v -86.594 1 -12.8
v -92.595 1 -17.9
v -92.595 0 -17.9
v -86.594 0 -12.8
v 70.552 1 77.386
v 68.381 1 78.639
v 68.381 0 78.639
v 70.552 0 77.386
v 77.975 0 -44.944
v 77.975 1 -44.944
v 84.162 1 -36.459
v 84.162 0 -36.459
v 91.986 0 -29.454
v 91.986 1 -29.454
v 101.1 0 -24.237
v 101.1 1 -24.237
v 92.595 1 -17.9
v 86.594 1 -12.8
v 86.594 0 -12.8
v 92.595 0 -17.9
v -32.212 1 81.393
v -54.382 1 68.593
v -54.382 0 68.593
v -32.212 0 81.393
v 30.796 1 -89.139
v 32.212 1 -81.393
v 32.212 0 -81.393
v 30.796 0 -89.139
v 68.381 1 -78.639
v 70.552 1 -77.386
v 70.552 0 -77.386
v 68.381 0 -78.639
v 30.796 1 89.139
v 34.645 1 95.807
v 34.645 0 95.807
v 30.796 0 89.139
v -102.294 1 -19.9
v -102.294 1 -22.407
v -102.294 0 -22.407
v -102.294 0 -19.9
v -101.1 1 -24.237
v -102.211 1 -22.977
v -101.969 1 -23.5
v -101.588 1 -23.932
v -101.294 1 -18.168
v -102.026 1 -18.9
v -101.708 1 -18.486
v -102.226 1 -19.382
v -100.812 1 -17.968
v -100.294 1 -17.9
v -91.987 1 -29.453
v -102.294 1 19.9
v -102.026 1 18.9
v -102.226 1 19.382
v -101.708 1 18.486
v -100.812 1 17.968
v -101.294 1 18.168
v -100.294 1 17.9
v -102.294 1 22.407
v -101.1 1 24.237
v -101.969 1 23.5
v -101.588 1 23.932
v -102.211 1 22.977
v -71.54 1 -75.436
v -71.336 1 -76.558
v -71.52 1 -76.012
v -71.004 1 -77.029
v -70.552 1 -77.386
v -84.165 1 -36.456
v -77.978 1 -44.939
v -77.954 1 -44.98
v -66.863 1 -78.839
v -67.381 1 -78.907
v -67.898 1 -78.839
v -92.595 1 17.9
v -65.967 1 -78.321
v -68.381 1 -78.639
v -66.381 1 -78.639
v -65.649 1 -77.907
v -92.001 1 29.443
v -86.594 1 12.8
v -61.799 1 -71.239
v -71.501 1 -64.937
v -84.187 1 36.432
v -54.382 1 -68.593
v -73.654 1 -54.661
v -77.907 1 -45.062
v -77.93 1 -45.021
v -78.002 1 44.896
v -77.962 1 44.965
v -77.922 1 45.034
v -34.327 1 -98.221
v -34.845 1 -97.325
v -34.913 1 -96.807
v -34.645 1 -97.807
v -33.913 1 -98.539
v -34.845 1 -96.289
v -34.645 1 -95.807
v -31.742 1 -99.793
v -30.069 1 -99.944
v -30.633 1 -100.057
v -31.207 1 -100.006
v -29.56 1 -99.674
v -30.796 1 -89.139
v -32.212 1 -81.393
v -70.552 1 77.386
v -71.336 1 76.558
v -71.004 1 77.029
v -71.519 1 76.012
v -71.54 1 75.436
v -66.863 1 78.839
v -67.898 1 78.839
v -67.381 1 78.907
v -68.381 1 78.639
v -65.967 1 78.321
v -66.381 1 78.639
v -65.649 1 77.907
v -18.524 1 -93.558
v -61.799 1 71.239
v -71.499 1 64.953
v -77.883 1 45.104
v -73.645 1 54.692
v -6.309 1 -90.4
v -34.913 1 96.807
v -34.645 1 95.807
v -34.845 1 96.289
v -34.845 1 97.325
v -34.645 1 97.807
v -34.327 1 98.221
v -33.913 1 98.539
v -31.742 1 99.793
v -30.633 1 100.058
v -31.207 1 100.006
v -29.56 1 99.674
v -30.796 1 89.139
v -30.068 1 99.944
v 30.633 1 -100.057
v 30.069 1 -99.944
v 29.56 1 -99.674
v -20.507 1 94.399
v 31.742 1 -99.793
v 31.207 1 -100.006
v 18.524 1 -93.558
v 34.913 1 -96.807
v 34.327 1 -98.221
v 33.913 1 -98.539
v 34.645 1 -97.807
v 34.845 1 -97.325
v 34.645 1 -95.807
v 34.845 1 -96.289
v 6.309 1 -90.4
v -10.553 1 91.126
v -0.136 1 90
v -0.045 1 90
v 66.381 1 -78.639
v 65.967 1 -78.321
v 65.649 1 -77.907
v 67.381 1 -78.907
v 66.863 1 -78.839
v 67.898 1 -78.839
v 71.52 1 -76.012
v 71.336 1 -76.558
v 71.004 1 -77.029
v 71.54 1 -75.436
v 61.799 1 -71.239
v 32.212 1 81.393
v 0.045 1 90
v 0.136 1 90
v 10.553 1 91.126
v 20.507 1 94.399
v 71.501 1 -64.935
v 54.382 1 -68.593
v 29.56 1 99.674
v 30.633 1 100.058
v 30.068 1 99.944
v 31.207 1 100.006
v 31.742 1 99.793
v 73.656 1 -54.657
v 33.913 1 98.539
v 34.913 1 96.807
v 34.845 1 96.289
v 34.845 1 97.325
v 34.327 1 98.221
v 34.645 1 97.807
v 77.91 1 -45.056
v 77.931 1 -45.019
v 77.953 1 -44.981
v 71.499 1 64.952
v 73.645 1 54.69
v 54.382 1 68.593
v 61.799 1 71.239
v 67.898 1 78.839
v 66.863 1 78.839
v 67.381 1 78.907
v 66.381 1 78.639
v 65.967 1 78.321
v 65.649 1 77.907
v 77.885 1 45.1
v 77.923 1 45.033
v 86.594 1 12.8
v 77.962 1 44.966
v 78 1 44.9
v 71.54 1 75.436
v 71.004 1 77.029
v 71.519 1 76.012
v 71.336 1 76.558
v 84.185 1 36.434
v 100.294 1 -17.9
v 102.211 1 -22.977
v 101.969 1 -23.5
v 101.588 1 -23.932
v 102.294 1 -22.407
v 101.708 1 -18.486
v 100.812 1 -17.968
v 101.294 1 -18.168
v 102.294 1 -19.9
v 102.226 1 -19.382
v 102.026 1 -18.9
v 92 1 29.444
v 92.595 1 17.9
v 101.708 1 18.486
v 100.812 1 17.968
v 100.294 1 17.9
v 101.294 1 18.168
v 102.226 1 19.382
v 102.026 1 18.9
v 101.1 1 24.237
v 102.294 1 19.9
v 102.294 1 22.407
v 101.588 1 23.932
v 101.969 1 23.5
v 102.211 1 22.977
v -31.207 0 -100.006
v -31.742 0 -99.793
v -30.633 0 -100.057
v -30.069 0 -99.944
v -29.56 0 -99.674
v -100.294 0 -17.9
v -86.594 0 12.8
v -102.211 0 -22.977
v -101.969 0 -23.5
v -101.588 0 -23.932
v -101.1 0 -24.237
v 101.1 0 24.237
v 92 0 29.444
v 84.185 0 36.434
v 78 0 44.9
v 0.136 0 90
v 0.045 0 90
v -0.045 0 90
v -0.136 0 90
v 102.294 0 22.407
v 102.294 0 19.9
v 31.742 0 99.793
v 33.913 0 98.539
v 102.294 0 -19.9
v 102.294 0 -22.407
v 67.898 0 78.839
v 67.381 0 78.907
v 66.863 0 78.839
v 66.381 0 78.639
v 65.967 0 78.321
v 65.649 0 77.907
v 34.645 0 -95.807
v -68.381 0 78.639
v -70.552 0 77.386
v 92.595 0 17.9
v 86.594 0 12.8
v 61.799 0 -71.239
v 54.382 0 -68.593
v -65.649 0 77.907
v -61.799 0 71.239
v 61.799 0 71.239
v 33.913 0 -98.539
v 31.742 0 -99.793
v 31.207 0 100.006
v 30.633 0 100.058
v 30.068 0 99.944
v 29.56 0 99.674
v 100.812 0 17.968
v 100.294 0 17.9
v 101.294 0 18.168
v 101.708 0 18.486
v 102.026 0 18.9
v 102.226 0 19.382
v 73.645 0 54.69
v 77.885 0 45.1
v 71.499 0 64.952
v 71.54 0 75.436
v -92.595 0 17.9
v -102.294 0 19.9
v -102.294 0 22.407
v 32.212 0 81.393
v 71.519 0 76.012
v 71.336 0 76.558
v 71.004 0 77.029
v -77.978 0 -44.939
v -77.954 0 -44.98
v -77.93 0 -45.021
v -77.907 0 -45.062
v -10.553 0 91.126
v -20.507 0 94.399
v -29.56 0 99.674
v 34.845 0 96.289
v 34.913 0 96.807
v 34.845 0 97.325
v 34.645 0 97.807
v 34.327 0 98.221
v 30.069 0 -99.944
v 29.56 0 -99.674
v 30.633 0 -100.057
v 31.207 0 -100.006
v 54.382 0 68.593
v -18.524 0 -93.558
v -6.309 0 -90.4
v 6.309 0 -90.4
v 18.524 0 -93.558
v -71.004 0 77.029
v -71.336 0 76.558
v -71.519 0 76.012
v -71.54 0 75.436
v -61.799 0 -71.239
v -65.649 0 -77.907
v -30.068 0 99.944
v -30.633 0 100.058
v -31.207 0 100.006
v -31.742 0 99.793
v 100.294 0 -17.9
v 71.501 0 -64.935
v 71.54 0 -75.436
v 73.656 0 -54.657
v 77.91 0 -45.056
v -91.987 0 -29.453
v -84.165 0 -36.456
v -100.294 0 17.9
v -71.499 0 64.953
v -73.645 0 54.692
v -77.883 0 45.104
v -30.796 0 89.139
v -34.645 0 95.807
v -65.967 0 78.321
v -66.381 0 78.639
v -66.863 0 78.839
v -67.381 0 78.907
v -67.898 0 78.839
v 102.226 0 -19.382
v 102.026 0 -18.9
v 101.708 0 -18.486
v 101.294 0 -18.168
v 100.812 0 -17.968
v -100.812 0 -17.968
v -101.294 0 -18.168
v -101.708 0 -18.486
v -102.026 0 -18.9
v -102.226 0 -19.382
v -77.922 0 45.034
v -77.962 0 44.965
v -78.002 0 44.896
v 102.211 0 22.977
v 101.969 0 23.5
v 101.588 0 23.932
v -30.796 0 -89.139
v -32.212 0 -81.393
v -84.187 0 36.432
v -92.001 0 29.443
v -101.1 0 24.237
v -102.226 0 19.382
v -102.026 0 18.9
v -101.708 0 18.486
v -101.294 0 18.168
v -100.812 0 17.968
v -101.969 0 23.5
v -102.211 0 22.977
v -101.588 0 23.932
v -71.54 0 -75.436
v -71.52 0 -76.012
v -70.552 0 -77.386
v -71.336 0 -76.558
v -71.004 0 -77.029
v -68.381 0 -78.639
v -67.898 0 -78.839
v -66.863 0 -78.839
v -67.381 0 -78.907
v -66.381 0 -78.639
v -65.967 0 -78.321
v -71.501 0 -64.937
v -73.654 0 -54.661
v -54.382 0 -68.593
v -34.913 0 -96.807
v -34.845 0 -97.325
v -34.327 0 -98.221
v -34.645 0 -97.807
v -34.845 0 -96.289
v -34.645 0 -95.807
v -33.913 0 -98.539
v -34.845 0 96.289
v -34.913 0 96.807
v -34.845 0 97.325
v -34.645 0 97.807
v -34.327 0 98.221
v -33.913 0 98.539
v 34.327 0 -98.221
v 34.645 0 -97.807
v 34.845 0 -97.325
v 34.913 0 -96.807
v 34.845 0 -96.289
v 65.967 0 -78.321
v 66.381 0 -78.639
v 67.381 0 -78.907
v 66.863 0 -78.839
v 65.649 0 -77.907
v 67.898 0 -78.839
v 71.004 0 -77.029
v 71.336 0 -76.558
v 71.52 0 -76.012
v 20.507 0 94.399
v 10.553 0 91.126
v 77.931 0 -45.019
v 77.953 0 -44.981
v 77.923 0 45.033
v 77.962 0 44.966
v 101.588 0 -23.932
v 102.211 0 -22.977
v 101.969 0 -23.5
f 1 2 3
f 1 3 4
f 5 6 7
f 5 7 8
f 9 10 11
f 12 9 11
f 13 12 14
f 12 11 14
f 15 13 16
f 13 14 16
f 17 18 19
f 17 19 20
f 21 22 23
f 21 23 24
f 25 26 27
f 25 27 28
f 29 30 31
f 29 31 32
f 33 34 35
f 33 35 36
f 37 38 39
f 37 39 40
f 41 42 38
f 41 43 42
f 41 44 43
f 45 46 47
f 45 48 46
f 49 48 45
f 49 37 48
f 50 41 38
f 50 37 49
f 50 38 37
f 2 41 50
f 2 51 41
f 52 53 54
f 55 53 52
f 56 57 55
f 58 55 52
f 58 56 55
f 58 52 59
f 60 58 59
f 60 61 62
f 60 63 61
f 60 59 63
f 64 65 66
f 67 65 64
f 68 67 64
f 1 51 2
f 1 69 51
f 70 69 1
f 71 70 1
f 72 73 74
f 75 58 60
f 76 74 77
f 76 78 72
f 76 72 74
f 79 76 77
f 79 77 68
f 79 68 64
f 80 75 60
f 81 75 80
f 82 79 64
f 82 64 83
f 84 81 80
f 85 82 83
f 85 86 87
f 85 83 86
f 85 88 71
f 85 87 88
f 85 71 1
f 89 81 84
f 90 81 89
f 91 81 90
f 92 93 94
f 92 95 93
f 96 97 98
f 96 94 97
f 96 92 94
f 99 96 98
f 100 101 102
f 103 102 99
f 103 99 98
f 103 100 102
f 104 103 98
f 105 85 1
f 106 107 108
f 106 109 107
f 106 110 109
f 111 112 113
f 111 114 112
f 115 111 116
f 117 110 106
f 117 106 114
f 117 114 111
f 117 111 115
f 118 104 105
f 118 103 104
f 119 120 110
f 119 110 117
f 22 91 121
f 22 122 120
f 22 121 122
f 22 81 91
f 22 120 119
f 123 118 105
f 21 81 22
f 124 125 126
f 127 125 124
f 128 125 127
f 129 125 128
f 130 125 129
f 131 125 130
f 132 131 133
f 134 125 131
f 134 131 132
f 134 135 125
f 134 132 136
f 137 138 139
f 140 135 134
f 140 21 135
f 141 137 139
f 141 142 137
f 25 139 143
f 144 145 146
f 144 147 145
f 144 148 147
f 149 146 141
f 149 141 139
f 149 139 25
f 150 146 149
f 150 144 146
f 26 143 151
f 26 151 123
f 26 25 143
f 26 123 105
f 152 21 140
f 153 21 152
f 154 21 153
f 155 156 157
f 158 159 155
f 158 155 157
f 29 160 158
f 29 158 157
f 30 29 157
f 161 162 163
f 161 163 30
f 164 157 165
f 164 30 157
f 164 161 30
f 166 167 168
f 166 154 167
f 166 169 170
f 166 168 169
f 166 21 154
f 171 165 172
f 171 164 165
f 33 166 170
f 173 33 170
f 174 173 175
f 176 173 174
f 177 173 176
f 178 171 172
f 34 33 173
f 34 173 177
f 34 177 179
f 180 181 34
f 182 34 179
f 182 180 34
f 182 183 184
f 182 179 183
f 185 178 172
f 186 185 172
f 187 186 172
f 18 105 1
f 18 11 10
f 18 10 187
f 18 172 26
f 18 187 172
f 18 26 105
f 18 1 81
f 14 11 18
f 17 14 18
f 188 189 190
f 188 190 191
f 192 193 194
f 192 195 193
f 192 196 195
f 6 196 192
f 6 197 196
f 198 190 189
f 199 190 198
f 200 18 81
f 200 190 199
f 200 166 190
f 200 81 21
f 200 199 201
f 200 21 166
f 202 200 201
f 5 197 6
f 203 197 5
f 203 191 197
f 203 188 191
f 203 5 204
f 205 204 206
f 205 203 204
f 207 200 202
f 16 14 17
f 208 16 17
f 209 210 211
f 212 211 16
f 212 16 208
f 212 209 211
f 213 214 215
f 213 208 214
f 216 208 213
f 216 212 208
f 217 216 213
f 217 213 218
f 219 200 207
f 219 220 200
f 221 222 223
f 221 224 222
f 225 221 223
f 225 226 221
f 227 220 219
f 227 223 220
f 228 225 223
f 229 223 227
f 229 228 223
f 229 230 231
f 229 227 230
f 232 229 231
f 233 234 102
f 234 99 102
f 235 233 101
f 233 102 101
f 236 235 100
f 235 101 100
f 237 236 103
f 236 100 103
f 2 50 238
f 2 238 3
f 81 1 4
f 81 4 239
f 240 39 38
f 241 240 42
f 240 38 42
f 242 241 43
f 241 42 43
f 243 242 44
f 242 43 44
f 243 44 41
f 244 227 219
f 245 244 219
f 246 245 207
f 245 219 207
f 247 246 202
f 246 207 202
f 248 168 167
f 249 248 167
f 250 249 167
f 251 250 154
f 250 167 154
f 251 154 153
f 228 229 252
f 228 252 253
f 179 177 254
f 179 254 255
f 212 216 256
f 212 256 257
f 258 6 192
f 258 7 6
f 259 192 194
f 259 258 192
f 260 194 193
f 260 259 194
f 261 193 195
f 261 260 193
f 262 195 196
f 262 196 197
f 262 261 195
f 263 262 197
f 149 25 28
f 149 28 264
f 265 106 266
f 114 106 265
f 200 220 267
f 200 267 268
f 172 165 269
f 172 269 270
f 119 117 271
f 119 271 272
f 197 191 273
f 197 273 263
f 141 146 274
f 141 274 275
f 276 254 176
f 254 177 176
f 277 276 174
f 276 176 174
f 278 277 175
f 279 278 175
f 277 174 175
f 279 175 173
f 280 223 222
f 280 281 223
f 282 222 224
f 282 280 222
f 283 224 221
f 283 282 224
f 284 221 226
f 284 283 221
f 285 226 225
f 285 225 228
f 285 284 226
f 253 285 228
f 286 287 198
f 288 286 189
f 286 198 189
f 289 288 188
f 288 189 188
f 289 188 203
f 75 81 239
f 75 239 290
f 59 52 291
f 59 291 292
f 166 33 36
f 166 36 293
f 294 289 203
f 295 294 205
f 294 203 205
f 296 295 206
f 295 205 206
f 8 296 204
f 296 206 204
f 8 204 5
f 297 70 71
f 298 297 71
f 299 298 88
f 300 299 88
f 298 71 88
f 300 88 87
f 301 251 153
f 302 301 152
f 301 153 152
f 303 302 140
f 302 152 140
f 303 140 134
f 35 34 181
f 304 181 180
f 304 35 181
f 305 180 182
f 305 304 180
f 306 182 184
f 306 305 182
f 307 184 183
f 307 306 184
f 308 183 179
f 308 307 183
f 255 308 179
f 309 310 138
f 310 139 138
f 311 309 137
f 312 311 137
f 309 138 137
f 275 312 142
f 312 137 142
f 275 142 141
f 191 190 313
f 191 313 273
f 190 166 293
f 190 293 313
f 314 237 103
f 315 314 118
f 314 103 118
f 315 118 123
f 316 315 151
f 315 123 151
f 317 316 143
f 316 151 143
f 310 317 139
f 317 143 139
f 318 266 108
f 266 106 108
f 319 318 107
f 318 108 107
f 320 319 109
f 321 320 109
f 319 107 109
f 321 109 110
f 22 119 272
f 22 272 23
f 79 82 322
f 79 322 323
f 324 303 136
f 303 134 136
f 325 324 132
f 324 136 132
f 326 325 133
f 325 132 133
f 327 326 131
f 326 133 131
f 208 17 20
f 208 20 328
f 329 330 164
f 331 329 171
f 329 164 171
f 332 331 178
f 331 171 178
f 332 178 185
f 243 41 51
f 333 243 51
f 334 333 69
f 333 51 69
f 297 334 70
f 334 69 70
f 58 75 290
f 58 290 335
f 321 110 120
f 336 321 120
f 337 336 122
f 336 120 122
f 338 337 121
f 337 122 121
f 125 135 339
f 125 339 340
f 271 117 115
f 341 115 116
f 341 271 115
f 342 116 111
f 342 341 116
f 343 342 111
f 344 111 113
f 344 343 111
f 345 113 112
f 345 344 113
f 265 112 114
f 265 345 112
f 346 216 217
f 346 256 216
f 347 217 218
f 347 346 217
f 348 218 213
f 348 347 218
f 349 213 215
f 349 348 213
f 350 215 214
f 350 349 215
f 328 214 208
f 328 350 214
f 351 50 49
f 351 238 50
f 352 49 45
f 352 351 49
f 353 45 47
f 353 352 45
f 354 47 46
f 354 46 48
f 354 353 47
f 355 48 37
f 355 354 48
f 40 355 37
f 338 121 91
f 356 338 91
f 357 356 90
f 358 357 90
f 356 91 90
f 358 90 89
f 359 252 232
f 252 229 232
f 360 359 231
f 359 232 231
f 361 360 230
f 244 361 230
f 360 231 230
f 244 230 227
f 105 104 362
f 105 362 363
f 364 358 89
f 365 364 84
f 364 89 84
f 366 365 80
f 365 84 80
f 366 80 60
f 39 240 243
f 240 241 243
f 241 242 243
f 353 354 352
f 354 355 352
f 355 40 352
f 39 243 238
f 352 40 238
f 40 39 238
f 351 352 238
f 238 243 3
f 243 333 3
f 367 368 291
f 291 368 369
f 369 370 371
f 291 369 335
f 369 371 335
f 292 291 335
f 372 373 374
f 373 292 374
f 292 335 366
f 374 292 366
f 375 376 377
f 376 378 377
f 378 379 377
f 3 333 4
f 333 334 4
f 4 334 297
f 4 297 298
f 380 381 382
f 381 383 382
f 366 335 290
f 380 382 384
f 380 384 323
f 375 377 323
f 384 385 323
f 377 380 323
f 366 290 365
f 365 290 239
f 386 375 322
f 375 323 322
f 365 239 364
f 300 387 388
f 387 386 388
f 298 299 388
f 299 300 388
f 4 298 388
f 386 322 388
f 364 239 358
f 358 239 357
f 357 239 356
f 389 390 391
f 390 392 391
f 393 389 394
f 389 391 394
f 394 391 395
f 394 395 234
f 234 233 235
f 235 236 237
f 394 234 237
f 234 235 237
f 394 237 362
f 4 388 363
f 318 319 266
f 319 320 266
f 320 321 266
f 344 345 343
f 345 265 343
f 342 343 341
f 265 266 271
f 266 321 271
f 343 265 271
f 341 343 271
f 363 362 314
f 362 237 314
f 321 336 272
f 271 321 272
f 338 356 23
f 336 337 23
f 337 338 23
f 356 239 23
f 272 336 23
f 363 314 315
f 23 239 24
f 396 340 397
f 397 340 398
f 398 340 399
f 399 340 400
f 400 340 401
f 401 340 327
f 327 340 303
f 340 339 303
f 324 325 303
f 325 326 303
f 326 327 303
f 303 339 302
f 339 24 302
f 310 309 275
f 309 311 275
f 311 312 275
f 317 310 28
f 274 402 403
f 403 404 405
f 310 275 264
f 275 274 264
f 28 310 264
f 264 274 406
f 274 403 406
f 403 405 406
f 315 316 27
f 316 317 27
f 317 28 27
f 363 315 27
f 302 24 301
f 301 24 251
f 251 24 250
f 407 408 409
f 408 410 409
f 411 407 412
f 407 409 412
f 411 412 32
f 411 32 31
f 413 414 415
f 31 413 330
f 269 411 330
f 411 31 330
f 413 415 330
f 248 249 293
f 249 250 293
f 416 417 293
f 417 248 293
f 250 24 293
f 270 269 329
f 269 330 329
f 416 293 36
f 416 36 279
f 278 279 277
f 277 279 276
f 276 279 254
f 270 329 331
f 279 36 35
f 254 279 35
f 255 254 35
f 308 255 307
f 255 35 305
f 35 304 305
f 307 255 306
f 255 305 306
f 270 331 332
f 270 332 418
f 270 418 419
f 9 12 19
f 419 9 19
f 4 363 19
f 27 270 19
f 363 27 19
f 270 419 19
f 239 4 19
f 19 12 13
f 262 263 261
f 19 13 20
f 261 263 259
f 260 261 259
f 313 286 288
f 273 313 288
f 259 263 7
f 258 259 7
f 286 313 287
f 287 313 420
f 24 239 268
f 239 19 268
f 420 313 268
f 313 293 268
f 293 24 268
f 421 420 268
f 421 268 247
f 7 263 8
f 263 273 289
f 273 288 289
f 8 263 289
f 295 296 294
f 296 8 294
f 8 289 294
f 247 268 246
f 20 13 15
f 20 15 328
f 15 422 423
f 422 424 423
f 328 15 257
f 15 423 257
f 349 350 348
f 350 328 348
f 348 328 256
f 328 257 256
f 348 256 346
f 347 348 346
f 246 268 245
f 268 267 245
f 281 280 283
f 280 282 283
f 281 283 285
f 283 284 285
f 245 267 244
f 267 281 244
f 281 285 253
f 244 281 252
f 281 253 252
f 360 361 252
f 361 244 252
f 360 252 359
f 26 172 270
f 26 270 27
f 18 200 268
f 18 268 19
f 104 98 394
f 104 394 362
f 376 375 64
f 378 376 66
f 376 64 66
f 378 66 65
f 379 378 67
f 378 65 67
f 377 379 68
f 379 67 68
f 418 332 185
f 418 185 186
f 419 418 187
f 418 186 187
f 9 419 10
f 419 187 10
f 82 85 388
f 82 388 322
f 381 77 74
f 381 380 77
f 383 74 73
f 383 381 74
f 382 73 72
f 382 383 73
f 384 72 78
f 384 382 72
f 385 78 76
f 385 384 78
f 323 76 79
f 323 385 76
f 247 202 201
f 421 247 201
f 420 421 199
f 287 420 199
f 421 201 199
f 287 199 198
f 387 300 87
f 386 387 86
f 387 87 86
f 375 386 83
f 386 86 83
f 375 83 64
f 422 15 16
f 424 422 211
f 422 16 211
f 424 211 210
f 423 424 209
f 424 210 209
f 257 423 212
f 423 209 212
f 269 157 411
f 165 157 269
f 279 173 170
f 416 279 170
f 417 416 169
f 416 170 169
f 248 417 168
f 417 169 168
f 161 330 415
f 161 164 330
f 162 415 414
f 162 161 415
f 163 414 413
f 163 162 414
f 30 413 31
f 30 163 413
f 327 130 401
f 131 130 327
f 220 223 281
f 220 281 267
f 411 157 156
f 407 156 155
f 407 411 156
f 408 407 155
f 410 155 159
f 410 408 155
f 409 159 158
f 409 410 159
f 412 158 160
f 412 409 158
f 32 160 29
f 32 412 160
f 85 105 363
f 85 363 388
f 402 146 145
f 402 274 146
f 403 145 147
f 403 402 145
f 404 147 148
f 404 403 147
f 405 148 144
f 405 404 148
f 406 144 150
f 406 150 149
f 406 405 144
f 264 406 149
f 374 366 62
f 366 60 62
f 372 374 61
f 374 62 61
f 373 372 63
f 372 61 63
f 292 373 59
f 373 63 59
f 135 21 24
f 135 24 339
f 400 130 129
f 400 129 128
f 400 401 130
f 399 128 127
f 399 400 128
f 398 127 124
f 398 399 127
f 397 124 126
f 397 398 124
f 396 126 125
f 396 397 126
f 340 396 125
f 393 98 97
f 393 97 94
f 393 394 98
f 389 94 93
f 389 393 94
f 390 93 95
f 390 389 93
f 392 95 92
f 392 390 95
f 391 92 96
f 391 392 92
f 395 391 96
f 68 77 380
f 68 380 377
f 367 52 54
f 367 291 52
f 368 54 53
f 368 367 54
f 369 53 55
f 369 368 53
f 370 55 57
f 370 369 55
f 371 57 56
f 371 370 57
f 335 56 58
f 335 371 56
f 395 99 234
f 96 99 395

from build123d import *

# Parameters (mm, degrees)
SKETCH2_R           = 1.35
BOSS_EXTRUDE1_DEPTH = 1
CIRPATTERN1_COUNT   = 6
CUT_EXTRUDE3_DEPTH  = 5
CUT_EXTRUDE9_DEPTH  = 10
CUT_EXTRUDE10_DEPTH = 186.676097905
FILLET2_R           = 2


with BuildPart() as part:
    # Sketch2 → Boss-Extrude1 (new body)
    with BuildSketch(Plane(origin=(0, 0, 0), x_dir=(1, 0, 0), z_dir=(0, 1, 0))):
        Polygon((0, 125), (-58.08143708, 125), (-35.58143708, 86.02885683), (-56.712456933, 73.82885683), (-79.212456933, 112.8), (-108.253175473, 62.5), (0, 0), align=None)
        with Locations(Location((-37.385731074, 81.753985699, 0), (0, 0, 270))):
            Circle(SKETCH2_R, mode=Mode.SUBTRACT)
        with Locations(Location((-52.108162939, 73.253985699, 0), (0, 0, 270))):
            Circle(SKETCH2_R, mode=Mode.SUBTRACT)
        with Locations(Location((-60.887328063, 75.459945743, 0), (0, 0, 270))):
            Circle(SKETCH2_R, mode=Mode.SUBTRACT)
        with Locations(Location((-34.90656595, 90.459945743, 0), (0, 0, 270))):
            Circle(SKETCH2_R, mode=Mode.SUBTRACT)
        with Locations(Location((-51.90656595, 119.904809472, 0), (0, 0, 270))):
            Circle(SKETCH2_R, mode=Mode.SUBTRACT)
        with Locations(Location((-43.40656595, 105.182377607, 0), (0, 0, 270))):
            Circle(SKETCH2_R, mode=Mode.SUBTRACT)
        with Locations(Location((-69.387328063, 90.182377607, 0), (0, 0, 270))):
            Circle(SKETCH2_R, mode=Mode.SUBTRACT)
        with Locations(Location((-77.887328063, 104.904809472, 0), (0, 0, 270))):
            Circle(SKETCH2_R, mode=Mode.SUBTRACT)
    boss_extrude1 = extrude(amount=BOSS_EXTRUDE1_DEPTH)

    # CirPattern1: Boss-Extrude1 ×6 about axis
    cirpattern1_axis = Axis((0, 0, 0), (0, 1, 0))
    for i in range(1, CIRPATTERN1_COUNT):
        add(boss_extrude1.rotate(cirpattern1_axis, i * 360 / CIRPATTERN1_COUNT))

    # Sketch4 → Cut-Extrude3 (cut)
    with BuildSketch(Plane(origin=(0, 1, 0), x_dir=(1, 0, 0), z_dir=(0, 1, 0))):
        with BuildLine():
            Line((79.212456933, -112.8), (137.293894013, -12.2))
            ThreePointArc((137.293894013, -12.2), (125.5592118, -23.716902798), (109.56410095, -27.524558982))
            ThreePointArc((109.56410095, -27.524558982), (77.942286341, -45), (78.619017782, -81.123015275))
            ThreePointArc((78.619017782, -81.123015275), (83.319046223, -96.879015699), (79.212456933, -112.8))
        make_face()
        with BuildLine():
            Line((137.293894013, 12.2), (79.212456933, 112.8))
            ThreePointArc((79.212456933, 112.8), (83.319046223, 96.879015699), (78.619017782, 81.123015275))
            ThreePointArc((78.619017782, 81.123015275), (77.942286341, 45), (109.56410095, 27.524558982))
            ThreePointArc((109.56410095, 27.524558982), (125.5592118, 23.716902798), (137.293894013, 12.2))
        make_face()
        with BuildLine():
            Line((58.08143708, 125), (-58.08143708, 125))
            ThreePointArc((-58.08143708, 125), (-42.240165578, 120.595918497), (-30.945083169, 108.647574257))
            ThreePointArc((-30.945083169, 108.647574257), (0, 90), (30.945083169, 108.647574257))
            ThreePointArc((30.945083169, 108.647574257), (42.240165578, 120.595918497), (58.08143708, 125))
        make_face()
        with BuildLine():
            Line((-79.212456933, 112.8), (-137.293894013, 12.2))
            ThreePointArc((-137.293894013, 12.2), (-125.5592118, 23.716902798), (-109.56410095, 27.524558982))
            ThreePointArc((-109.56410095, 27.524558982), (-77.942286341, 45), (-78.619017782, 81.123015275))
            ThreePointArc((-78.619017782, 81.123015275), (-83.319046223, 96.879015699), (-79.212456933, 112.8))
        make_face()
        with BuildLine():
            Line((-137.293894013, -12.2), (-79.212456933, -112.8))
            ThreePointArc((-79.212456933, -112.8), (-83.319046223, -96.879015699), (-78.619017782, -81.123015275))
            ThreePointArc((-78.619017782, -81.123015275), (-77.942286341, -45), (-109.56410095, -27.524558982))
            ThreePointArc((-109.56410095, -27.524558982), (-125.5592118, -23.716902798), (-137.293894013, -12.2))
        make_face()
        with BuildLine():
            Line((-58.08143708, -125), (58.08143708, -125))
            ThreePointArc((58.08143708, -125), (42.240165578, -120.595918497), (30.945083169, -108.647574257))
            ThreePointArc((30.945083169, -108.647574257), (0, -90), (-30.945083169, -108.647574257))
            ThreePointArc((-30.945083169, -108.647574257), (-42.240165578, -120.595918497), (-58.08143708, -125))
        make_face()
    extrude(amount=-CUT_EXTRUDE3_DEPTH, mode=Mode.SUBTRACT)

    # Sketch8 → Cut-Extrude9 (cut)
    with BuildSketch(Plane(origin=(0, 1, 0), x_dir=(1, 0, 0), z_dir=(0, 1, 0))):
        with BuildLine():
            Line((-79.627397697, 112.081427342), (-137.090413308, 12.563994028))
            ThreePointArc((-137.090413308, 12.563994028), (-131.312677504, 18.215244412), (-123.44128918, 20.048304088))
            ThreePointArc((-123.44128918, 20.048304088), (-77.942300503, 45.000018775), (-79.083064161, 96.879154221))
            ThreePointArc((-79.083064161, 96.879154221), (-81.425302856, 104.406169658), (-79.627397697, 112.081427342))
        make_face()
        with BuildLine():
            Line((-136.879097611, -12.918653567), (-79.425980046, -112.441801521))
            ThreePointArc((-79.425980046, -112.441801521), (-81.43123854, -104.612510346), (-79.083020624, -96.879158257))
            ThreePointArc((-79.083020624, -96.879158257), (-77.942345072, -45.000020873), (-123.441376125, -20.048383457))
            ThreePointArc((-123.441376125, -20.048383457), (-131.131082054, -18.31331395), (-136.879097611, -12.918653567))
        make_face()
        with BuildLine():
            Line((-57.251702025, -125.000120556), (57.66443115, -125.005835196))
            ThreePointArc((57.66443115, -125.005835196), (49.881436852, -122.827794405), (44.358266444, -116.927501992))
            ThreePointArc((44.358266444, -116.927501992), (-4.6681e-05, -90.000079294), (-44.358314075, -116.927577326))
            ThreePointArc((-44.358314075, -116.927577326), (-49.70578131, -122.719523255), (-57.251702025, -125.000120556))
        make_face()
        with BuildLine():
            Line((79.627393474, -112.081506636), (137.090409084, -12.564073322))
            ThreePointArc((137.090409084, -12.564073322), (131.312673281, -18.215323706), (123.441284957, -20.048383382))
            ThreePointArc((123.441284957, -20.048383382), (77.94229628, -45.000098069), (79.083059938, -96.879233516))
            ThreePointArc((79.083059938, -96.879233516), (81.425298632, -104.406248952), (79.627393474, -112.081506636))
        make_face()
        with BuildLine():
            Line((136.879093387, 12.918574273), (79.425975823, 112.441722226))
            ThreePointArc((79.425975823, 112.441722226), (81.431234317, 104.612431052), (79.083016401, 96.879078963))
            ThreePointArc((79.083016401, 96.879078963), (77.942340849, 44.999941578), (123.441371902, 20.048304163))
            ThreePointArc((123.441371902, 20.048304163), (131.131077831, 18.313234656), (136.879093387, 12.918574273))
        make_face()
        with BuildLine():
            Line((57.251697801, 125.000041262), (-57.664435373, 125.005755901))
            ThreePointArc((-57.664435373, 125.005755901), (-49.881441076, 122.827715111), (-44.358270668, 116.927422698))
            ThreePointArc((-44.358270668, 116.927422698), (4.2458e-05, 90), (44.358309852, 116.927498031))
            ThreePointArc((44.358309852, 116.927498031), (49.705777087, 122.71944396), (57.251697801, 125.000041262))
        make_face()
    extrude(amount=-CUT_EXTRUDE9_DEPTH, mode=Mode.SUBTRACT)

    # Sketch9 → Cut-Extrude10 (cut, through all)
    with BuildSketch(Plane(origin=(0, 1, 0), x_dir=(1, 0, 0), z_dir=(0, 1, 0))):
        Polygon((86.593894013, 12.8), (92.594856816, 17.9), (102.293894013, 17.9), (102.293894013, 27.495537581), (142.49088479, 27.495537581), (142.49088479, -27.407665194), (102.293894013, -27.407665194), (102.293894013, -17.9), (92.594856816, -17.9), (86.593894013, -12.8), align=None)
        Polygon((95.057276431, -109.652957246), (47.509708079, -137.104558633), (27.41121269, -102.292943464), (35.645092279, -97.539110868), (30.79557368, -89.139498262), (32.211821838, -81.392512028), (54.382072175, -68.592512028), (61.799283136, -71.239498262), (66.648801734, -79.639110868), (74.958781042, -74.841342077), align=None)
        Polygon((-47.43360836, -137.148494826), (-94.981176711, -109.696893439), (-74.882681323, -74.885278271), (-66.648801734, -79.639110868), (-61.799283136, -71.239498262), (-54.382072175, -68.592512028), (-32.211821838, -81.392512028), (-30.79557368, -89.139498262), (-35.645092279, -97.539110868), (-27.335112971, -102.336879658), align=None)
        Polygon((-142.49088479, -27.495537581), (-142.49088479, 27.407665194), (-102.293894013, 27.407665194), (-102.293894013, 17.9), (-92.594856816, 17.9), (-86.593894013, 12.8), (-86.593894013, -12.8), (-92.594856816, -17.9), (-102.293894013, -17.9), (-102.293894013, -27.495537581), align=None)
        Polygon((-95.057276431, 109.652957246), (-47.509708079, 137.104558633), (-27.41121269, 102.292943464), (-35.645092279, 97.539110868), (-30.79557368, 89.139498262), (-32.211821838, 81.392512028), (-54.382072175, 68.592512028), (-61.799283136, 71.239498262), (-66.648801734, 79.639110868), (-74.958781042, 74.841342077), align=None)
        Polygon((47.43360836, 137.148494826), (94.981176711, 109.696893439), (74.882681323, 74.885278271), (66.648801734, 79.639110868), (61.799283136, 71.239498262), (54.382072175, 68.592512028), (32.211821838, 81.392512028), (30.79557368, 89.139498262), (35.645092279, 97.539110868), (27.335112971, 102.336879658), align=None)
    extrude(amount=-CUT_EXTRUDE10_DEPTH, mode=Mode.SUBTRACT)

    # Fillet2
    fillet2_edges = [part.edges().sort_by_distance(p)[0] for p in [
        (30.596139754, 0.5, -100.454124967),
        (-30.596139754, 0.5, -100.454124967),
        (71.697787846, 0.5, -76.724077377),
        (102.293894013, 0.5, -23.730020176),
        (102.293894013, 0.5, 23.730102263),
        (71.697775448, 0.5, 76.724084535),
        (30.596078644, 0.5, 100.454160249),
        (-30.596083481, 0.5, 100.454157456),
        (-71.697781783, 0.5, 76.724080878),
        (-102.293894013, 0.5, 23.7301012),
        (-71.697789343, 0.5, -76.724076512),
        (-102.293894013, 0.5, -23.730024698),
        (66.648801734, 0.5, 79.639110868),
        (35.645092279, 0.5, 97.539110868),
        (-35.645092279, 0.5, 97.539110868),
        (-66.648801734, 0.5, 79.639110868),
        (-102.293894013, 0.5, 17.9),
        (-102.293894013, 0.5, -17.9),
        (-66.648801734, 0.5, -79.639110868),
        (-35.645092279, 0.5, -97.539110868),
        (35.645092279, 0.5, -97.539110868),
        (66.648801734, 0.5, -79.639110868),
        (102.293894013, 0.5, -17.9),
        (102.293894013, 0.5, 17.9),
    ]]
    fillet(fillet2_edges, radius=FILLET2_R)


solid = part.part
